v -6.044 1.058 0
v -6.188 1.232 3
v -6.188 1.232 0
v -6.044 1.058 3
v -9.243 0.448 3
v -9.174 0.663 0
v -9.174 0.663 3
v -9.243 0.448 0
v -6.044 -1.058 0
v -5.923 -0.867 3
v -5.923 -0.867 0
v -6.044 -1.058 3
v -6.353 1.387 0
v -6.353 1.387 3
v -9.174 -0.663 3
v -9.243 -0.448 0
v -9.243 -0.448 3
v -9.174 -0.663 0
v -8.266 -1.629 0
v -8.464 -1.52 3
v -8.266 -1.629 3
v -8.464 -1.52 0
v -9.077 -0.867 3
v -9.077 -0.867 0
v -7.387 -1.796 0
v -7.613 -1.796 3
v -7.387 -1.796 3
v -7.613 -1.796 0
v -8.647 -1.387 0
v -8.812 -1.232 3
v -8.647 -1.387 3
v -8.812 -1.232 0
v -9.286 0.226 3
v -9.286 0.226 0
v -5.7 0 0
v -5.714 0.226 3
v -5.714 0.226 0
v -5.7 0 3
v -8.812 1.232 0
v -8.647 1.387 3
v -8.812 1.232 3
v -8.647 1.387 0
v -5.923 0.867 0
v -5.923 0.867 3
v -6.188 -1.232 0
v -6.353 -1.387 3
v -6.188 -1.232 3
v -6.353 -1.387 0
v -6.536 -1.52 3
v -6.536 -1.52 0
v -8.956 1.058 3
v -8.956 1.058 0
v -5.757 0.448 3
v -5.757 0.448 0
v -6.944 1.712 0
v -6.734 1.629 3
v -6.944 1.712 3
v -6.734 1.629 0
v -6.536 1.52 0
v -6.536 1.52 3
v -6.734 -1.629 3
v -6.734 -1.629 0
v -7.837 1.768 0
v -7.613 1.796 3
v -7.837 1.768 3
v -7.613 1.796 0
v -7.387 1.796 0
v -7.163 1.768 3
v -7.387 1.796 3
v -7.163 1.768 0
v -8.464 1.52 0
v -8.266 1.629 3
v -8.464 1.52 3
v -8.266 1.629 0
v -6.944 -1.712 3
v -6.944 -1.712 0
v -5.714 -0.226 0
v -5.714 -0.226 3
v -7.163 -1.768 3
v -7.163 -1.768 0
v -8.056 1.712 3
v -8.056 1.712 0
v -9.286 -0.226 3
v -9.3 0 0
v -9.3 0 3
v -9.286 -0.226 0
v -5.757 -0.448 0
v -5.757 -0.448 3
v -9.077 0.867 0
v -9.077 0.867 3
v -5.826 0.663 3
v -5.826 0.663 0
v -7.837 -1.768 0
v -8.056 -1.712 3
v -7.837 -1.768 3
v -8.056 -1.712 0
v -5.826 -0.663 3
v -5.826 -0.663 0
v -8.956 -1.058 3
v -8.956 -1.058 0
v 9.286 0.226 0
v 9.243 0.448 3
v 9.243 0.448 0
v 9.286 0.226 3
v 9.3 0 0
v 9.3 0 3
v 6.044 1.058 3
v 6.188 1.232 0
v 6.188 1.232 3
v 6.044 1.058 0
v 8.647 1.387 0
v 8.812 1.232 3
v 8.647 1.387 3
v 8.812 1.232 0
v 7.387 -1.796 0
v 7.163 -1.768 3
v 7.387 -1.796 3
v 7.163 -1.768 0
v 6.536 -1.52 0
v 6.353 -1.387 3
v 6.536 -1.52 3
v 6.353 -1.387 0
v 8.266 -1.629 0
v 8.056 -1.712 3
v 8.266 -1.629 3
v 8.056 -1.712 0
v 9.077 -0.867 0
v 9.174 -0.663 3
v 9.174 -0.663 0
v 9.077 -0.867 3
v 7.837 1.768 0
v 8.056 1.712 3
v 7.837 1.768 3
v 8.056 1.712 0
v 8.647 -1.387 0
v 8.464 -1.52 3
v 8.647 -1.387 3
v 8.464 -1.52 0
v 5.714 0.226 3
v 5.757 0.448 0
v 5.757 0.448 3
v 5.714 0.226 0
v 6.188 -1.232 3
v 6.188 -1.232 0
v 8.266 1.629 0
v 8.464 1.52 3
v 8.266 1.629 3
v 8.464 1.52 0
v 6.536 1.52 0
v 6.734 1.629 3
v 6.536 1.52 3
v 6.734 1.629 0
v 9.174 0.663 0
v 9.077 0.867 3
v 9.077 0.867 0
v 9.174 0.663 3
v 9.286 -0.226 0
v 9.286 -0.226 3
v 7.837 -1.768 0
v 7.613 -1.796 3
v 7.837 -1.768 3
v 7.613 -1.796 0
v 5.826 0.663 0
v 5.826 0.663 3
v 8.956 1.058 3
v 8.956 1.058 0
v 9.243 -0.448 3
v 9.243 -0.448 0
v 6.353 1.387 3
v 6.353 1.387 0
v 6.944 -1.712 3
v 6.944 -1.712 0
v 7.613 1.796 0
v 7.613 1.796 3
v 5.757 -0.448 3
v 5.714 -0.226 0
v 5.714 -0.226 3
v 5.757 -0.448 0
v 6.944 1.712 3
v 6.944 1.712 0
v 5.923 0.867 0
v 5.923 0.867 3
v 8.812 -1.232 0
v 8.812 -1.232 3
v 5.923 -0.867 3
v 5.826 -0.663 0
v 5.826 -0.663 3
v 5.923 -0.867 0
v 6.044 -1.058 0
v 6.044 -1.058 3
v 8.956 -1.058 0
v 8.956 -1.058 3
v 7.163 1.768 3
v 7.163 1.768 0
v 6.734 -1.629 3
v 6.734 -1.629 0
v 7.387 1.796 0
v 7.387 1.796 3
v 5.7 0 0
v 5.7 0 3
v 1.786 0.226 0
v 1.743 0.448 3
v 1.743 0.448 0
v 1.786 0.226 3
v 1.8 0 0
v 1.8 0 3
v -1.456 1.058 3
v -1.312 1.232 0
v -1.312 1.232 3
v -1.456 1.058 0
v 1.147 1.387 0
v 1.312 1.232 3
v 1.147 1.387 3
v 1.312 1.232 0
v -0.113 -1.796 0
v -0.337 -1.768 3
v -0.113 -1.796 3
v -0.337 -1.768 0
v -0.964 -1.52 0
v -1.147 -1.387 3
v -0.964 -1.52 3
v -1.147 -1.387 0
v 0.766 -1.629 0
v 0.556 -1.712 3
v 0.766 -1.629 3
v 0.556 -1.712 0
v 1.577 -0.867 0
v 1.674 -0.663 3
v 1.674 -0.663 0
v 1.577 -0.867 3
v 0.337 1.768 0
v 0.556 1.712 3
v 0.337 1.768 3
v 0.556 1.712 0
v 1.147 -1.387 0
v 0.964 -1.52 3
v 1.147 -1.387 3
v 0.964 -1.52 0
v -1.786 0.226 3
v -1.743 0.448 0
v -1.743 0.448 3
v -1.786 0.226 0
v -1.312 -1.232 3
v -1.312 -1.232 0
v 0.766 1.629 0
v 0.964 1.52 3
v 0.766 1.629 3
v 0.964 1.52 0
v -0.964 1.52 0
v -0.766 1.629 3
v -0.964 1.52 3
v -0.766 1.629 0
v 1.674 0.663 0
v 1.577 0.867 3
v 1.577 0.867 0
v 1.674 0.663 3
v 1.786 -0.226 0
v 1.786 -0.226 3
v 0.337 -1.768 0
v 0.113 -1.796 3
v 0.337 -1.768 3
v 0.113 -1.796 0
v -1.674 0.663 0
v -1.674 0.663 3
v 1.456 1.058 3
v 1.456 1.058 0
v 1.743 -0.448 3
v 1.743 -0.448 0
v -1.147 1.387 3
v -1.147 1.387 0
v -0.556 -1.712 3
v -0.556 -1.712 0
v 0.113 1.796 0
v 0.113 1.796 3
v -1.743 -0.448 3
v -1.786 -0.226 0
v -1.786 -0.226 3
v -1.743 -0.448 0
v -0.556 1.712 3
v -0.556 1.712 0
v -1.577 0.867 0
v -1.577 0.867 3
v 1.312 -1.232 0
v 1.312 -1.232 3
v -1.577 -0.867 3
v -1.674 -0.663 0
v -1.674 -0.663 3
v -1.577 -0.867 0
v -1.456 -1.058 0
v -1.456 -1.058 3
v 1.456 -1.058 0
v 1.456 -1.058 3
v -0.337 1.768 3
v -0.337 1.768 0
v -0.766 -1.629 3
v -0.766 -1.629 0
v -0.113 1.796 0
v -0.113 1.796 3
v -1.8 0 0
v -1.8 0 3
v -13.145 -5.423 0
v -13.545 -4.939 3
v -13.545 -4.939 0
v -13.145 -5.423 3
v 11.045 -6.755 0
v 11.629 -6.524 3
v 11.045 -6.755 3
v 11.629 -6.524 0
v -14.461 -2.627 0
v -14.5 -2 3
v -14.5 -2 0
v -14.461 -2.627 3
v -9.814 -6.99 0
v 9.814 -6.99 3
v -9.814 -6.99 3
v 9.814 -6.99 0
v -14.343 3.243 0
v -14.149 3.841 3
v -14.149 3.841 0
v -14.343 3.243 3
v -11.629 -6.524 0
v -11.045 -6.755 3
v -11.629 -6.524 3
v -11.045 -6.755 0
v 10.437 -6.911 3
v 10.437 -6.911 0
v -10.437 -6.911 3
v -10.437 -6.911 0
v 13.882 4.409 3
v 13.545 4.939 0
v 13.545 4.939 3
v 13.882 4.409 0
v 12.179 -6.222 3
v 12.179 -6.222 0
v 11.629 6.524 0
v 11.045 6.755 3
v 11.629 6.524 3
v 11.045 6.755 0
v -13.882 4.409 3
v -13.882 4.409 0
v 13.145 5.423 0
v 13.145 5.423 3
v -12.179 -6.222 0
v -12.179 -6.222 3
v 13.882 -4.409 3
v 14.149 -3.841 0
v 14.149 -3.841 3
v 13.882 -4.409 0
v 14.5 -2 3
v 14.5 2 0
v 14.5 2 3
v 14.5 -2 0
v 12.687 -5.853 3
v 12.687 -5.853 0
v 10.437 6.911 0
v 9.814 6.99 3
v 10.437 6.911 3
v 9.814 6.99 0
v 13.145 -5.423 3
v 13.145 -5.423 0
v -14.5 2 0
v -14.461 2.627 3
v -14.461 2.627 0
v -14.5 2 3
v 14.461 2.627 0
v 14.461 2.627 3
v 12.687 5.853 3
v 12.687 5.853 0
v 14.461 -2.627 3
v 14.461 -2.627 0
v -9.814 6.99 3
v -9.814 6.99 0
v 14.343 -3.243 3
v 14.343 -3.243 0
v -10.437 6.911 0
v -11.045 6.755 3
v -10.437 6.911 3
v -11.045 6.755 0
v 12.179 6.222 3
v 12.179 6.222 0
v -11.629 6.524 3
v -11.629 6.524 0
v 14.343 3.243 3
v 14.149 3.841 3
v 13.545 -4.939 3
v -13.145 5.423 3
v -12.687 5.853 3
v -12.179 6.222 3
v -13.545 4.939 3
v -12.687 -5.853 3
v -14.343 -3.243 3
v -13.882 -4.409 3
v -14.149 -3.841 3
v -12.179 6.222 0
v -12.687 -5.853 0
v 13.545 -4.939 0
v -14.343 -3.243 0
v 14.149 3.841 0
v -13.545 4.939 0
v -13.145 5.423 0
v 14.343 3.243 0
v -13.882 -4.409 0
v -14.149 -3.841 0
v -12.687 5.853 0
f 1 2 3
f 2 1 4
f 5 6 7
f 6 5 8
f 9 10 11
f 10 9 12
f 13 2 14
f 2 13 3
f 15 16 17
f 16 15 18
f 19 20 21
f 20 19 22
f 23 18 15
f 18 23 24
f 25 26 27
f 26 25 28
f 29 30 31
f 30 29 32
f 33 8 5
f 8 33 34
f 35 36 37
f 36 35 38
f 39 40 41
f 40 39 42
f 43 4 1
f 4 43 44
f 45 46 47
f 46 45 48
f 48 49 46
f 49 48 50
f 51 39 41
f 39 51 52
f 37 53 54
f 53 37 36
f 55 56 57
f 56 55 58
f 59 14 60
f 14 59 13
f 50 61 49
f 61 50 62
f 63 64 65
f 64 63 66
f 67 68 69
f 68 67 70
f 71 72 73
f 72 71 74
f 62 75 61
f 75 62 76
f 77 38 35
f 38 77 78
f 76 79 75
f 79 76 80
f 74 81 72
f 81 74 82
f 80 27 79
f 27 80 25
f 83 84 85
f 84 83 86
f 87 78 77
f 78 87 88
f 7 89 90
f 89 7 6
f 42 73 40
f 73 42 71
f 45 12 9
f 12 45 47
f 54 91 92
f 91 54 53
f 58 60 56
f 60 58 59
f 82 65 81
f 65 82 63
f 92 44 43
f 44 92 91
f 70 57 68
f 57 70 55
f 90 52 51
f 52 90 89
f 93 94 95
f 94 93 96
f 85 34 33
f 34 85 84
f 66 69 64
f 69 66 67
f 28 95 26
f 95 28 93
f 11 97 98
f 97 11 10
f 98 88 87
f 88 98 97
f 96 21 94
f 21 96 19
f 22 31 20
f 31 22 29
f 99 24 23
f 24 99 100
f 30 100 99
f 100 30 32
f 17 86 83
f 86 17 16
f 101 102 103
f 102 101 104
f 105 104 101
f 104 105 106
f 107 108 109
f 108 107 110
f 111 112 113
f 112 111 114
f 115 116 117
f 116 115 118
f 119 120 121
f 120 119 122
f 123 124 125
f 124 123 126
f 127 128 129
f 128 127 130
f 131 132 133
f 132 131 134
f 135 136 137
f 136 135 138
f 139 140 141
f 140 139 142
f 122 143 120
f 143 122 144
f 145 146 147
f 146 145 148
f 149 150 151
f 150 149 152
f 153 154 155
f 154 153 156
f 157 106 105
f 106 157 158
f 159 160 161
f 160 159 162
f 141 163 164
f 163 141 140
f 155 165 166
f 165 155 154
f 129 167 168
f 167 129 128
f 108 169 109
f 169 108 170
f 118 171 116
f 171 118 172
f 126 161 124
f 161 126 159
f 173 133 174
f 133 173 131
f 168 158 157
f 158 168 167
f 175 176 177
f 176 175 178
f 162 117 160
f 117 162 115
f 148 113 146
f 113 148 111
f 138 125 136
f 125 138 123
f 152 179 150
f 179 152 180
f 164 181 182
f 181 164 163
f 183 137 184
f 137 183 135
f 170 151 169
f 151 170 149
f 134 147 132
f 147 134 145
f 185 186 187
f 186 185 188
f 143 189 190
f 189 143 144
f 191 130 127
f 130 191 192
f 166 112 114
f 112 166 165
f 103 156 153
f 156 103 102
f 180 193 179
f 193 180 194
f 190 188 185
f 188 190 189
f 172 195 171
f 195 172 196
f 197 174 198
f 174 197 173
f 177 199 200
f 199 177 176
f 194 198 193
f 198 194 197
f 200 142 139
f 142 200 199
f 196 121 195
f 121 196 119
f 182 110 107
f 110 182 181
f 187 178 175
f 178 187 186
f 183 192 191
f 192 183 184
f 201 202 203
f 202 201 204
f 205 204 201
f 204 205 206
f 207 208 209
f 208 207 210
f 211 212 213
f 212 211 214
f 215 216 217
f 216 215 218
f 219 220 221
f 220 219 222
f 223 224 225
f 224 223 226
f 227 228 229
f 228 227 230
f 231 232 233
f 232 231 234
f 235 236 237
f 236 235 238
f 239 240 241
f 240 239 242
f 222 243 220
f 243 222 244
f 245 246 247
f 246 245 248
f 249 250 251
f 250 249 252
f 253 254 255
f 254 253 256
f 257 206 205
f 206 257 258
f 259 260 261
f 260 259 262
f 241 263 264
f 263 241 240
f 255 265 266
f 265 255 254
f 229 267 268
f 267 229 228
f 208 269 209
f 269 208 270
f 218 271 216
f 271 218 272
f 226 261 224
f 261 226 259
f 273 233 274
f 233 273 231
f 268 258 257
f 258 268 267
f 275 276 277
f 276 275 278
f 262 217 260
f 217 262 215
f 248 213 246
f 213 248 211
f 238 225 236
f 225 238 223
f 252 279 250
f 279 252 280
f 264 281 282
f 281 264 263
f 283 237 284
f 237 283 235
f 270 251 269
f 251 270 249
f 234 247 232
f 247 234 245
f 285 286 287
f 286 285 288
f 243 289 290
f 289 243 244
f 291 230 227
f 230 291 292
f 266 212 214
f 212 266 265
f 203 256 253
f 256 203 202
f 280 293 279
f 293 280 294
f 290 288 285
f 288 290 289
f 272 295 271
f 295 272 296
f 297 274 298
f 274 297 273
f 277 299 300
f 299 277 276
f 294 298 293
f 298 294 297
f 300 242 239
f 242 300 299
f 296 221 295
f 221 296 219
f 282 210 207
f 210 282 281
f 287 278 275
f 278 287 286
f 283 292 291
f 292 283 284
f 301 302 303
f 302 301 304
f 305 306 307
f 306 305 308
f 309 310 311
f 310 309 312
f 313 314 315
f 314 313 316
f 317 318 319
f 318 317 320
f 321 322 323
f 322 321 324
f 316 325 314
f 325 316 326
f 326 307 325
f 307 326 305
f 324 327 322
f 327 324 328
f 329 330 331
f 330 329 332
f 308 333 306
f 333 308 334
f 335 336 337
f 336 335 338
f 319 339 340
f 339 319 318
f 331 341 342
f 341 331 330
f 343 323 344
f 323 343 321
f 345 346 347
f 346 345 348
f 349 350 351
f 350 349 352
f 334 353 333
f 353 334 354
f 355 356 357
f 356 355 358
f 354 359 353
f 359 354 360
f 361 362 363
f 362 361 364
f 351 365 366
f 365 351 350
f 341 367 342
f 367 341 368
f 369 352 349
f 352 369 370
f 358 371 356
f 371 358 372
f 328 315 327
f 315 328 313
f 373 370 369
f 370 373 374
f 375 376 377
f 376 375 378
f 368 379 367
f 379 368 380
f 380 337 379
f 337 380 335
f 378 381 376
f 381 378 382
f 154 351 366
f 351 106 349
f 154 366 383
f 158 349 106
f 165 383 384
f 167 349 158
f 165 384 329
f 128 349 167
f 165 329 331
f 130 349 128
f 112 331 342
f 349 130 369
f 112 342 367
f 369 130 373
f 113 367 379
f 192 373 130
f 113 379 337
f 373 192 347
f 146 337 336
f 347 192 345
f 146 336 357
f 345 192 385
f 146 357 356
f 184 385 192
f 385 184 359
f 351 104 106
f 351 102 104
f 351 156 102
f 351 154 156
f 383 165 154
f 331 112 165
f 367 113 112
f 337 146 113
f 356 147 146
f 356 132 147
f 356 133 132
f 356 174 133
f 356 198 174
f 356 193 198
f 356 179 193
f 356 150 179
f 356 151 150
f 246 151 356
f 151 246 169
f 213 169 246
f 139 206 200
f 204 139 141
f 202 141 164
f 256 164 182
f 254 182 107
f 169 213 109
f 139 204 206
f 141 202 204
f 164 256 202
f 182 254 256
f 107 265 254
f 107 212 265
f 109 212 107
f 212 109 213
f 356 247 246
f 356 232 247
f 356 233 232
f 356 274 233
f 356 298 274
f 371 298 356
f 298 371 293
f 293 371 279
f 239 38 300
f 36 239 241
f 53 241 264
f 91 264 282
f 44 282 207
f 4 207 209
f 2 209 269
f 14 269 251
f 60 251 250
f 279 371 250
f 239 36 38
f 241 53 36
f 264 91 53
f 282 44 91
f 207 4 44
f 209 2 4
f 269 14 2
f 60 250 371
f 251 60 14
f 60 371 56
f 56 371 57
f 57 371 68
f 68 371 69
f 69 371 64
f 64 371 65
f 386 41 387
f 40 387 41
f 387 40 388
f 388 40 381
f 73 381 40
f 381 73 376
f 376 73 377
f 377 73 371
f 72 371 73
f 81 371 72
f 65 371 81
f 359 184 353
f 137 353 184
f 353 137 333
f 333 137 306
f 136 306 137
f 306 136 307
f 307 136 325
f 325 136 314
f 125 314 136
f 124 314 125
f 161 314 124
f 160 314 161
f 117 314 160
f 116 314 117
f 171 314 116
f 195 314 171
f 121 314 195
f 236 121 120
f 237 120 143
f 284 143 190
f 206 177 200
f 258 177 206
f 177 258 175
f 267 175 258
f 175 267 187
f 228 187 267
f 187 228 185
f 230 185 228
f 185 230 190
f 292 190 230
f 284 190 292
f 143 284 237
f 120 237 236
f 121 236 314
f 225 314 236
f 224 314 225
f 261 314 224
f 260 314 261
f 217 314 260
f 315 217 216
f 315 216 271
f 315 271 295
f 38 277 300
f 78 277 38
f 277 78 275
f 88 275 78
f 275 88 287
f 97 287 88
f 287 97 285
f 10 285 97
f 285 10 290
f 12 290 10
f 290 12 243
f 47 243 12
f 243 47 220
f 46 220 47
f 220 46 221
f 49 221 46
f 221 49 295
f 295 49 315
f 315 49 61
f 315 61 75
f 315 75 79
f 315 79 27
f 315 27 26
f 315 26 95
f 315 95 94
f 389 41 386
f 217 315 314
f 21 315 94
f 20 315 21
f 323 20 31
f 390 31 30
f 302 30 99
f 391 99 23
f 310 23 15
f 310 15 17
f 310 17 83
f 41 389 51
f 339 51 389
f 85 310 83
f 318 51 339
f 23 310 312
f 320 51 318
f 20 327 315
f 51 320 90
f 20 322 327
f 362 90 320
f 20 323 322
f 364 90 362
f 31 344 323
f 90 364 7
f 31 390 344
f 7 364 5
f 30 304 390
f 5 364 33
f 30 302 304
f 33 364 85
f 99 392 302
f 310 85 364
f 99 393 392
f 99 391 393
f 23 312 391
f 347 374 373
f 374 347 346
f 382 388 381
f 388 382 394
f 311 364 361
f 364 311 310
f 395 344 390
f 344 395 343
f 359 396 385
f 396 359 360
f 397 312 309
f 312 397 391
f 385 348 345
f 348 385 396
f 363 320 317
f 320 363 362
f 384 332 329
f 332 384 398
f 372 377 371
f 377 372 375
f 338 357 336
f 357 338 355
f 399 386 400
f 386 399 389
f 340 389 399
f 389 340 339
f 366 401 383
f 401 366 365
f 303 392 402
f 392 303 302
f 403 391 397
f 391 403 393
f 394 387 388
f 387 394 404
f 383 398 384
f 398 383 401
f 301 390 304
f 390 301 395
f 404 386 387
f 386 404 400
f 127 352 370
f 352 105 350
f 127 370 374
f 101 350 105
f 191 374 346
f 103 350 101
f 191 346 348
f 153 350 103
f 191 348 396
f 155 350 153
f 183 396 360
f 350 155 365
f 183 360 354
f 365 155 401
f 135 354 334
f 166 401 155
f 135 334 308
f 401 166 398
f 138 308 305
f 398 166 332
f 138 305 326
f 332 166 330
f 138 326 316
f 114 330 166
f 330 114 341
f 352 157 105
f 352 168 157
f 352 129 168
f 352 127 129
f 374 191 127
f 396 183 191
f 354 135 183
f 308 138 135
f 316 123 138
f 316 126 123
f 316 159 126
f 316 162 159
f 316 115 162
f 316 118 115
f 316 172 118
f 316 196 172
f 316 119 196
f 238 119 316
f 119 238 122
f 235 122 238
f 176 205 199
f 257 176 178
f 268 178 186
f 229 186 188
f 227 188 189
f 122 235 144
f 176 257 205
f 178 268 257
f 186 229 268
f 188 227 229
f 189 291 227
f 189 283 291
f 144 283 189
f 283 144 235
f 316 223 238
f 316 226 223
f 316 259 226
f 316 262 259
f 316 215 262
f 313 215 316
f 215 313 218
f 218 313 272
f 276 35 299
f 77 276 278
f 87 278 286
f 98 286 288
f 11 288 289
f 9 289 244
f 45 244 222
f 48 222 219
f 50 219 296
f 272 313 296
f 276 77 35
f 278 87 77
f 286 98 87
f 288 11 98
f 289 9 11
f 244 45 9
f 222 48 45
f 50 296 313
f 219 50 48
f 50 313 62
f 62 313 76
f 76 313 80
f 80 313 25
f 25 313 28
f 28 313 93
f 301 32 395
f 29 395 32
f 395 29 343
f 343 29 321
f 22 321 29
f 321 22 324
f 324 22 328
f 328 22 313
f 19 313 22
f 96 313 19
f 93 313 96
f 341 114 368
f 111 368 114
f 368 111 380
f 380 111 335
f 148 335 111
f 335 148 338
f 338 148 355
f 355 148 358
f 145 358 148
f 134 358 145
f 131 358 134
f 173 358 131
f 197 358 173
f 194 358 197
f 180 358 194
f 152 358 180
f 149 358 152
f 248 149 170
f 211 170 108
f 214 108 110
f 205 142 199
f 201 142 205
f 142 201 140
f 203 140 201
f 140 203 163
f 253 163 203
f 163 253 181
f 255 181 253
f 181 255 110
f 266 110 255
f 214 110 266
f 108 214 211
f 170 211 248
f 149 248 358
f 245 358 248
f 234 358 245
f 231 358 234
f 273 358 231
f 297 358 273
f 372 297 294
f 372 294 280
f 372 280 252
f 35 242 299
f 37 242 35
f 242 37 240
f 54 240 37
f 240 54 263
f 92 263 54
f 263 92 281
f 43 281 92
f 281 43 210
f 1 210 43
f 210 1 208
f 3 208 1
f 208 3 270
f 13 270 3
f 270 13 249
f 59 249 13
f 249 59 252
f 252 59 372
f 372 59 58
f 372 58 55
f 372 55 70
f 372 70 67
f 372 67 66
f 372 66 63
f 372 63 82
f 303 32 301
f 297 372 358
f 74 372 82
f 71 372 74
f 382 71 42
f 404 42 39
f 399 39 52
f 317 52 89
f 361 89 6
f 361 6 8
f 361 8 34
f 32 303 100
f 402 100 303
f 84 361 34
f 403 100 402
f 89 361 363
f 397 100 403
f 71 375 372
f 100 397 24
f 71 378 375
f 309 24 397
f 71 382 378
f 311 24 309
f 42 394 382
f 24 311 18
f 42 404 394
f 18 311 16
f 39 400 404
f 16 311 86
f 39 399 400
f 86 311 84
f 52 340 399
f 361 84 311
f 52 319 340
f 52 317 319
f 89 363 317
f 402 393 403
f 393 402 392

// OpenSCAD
$fn = 50;


difference() {
	union() {
		hull() {
			translate(v = [-9.5000000000, 2.0000000000, 0]) {
				cylinder(h = 3, r = 5);
			}
			translate(v = [9.5000000000, 2.0000000000, 0]) {
				cylinder(h = 3, r = 5);
			}
			translate(v = [-9.5000000000, -2.0000000000, 0]) {
				cylinder(h = 3, r = 5);
			}
			translate(v = [9.5000000000, -2.0000000000, 0]) {
				cylinder(h = 3, r = 5);
			}
		}
	}
	union() {
		translate(v = [-7.5000000000, 0.0000000000, 0]) {
			translate(v = [0, 0, -100]) {
				cylinder(h = 200, r = 1.8000000000);
			}
		}
		translate(v = [7.5000000000, 0.0000000000, 0]) {
			translate(v = [0, 0, -100]) {
				cylinder(h = 200, r = 1.8000000000);
			}
		}
		translate(v = [-7.5000000000, 0.0000000000, 0]) {
			translate(v = [0, 0, -100]) {
				cylinder(h = 200, r = 1.8000000000);
			}
		}
		translate(v = [0, 0, -100]) {
			cylinder(h = 200, r = 1.8000000000);
		}
		translate(v = [7.5000000000, 0.0000000000, 0]) {
			translate(v = [0, 0, -100]) {
				cylinder(h = 200, r = 1.8000000000);
			}
		}
	}
}
